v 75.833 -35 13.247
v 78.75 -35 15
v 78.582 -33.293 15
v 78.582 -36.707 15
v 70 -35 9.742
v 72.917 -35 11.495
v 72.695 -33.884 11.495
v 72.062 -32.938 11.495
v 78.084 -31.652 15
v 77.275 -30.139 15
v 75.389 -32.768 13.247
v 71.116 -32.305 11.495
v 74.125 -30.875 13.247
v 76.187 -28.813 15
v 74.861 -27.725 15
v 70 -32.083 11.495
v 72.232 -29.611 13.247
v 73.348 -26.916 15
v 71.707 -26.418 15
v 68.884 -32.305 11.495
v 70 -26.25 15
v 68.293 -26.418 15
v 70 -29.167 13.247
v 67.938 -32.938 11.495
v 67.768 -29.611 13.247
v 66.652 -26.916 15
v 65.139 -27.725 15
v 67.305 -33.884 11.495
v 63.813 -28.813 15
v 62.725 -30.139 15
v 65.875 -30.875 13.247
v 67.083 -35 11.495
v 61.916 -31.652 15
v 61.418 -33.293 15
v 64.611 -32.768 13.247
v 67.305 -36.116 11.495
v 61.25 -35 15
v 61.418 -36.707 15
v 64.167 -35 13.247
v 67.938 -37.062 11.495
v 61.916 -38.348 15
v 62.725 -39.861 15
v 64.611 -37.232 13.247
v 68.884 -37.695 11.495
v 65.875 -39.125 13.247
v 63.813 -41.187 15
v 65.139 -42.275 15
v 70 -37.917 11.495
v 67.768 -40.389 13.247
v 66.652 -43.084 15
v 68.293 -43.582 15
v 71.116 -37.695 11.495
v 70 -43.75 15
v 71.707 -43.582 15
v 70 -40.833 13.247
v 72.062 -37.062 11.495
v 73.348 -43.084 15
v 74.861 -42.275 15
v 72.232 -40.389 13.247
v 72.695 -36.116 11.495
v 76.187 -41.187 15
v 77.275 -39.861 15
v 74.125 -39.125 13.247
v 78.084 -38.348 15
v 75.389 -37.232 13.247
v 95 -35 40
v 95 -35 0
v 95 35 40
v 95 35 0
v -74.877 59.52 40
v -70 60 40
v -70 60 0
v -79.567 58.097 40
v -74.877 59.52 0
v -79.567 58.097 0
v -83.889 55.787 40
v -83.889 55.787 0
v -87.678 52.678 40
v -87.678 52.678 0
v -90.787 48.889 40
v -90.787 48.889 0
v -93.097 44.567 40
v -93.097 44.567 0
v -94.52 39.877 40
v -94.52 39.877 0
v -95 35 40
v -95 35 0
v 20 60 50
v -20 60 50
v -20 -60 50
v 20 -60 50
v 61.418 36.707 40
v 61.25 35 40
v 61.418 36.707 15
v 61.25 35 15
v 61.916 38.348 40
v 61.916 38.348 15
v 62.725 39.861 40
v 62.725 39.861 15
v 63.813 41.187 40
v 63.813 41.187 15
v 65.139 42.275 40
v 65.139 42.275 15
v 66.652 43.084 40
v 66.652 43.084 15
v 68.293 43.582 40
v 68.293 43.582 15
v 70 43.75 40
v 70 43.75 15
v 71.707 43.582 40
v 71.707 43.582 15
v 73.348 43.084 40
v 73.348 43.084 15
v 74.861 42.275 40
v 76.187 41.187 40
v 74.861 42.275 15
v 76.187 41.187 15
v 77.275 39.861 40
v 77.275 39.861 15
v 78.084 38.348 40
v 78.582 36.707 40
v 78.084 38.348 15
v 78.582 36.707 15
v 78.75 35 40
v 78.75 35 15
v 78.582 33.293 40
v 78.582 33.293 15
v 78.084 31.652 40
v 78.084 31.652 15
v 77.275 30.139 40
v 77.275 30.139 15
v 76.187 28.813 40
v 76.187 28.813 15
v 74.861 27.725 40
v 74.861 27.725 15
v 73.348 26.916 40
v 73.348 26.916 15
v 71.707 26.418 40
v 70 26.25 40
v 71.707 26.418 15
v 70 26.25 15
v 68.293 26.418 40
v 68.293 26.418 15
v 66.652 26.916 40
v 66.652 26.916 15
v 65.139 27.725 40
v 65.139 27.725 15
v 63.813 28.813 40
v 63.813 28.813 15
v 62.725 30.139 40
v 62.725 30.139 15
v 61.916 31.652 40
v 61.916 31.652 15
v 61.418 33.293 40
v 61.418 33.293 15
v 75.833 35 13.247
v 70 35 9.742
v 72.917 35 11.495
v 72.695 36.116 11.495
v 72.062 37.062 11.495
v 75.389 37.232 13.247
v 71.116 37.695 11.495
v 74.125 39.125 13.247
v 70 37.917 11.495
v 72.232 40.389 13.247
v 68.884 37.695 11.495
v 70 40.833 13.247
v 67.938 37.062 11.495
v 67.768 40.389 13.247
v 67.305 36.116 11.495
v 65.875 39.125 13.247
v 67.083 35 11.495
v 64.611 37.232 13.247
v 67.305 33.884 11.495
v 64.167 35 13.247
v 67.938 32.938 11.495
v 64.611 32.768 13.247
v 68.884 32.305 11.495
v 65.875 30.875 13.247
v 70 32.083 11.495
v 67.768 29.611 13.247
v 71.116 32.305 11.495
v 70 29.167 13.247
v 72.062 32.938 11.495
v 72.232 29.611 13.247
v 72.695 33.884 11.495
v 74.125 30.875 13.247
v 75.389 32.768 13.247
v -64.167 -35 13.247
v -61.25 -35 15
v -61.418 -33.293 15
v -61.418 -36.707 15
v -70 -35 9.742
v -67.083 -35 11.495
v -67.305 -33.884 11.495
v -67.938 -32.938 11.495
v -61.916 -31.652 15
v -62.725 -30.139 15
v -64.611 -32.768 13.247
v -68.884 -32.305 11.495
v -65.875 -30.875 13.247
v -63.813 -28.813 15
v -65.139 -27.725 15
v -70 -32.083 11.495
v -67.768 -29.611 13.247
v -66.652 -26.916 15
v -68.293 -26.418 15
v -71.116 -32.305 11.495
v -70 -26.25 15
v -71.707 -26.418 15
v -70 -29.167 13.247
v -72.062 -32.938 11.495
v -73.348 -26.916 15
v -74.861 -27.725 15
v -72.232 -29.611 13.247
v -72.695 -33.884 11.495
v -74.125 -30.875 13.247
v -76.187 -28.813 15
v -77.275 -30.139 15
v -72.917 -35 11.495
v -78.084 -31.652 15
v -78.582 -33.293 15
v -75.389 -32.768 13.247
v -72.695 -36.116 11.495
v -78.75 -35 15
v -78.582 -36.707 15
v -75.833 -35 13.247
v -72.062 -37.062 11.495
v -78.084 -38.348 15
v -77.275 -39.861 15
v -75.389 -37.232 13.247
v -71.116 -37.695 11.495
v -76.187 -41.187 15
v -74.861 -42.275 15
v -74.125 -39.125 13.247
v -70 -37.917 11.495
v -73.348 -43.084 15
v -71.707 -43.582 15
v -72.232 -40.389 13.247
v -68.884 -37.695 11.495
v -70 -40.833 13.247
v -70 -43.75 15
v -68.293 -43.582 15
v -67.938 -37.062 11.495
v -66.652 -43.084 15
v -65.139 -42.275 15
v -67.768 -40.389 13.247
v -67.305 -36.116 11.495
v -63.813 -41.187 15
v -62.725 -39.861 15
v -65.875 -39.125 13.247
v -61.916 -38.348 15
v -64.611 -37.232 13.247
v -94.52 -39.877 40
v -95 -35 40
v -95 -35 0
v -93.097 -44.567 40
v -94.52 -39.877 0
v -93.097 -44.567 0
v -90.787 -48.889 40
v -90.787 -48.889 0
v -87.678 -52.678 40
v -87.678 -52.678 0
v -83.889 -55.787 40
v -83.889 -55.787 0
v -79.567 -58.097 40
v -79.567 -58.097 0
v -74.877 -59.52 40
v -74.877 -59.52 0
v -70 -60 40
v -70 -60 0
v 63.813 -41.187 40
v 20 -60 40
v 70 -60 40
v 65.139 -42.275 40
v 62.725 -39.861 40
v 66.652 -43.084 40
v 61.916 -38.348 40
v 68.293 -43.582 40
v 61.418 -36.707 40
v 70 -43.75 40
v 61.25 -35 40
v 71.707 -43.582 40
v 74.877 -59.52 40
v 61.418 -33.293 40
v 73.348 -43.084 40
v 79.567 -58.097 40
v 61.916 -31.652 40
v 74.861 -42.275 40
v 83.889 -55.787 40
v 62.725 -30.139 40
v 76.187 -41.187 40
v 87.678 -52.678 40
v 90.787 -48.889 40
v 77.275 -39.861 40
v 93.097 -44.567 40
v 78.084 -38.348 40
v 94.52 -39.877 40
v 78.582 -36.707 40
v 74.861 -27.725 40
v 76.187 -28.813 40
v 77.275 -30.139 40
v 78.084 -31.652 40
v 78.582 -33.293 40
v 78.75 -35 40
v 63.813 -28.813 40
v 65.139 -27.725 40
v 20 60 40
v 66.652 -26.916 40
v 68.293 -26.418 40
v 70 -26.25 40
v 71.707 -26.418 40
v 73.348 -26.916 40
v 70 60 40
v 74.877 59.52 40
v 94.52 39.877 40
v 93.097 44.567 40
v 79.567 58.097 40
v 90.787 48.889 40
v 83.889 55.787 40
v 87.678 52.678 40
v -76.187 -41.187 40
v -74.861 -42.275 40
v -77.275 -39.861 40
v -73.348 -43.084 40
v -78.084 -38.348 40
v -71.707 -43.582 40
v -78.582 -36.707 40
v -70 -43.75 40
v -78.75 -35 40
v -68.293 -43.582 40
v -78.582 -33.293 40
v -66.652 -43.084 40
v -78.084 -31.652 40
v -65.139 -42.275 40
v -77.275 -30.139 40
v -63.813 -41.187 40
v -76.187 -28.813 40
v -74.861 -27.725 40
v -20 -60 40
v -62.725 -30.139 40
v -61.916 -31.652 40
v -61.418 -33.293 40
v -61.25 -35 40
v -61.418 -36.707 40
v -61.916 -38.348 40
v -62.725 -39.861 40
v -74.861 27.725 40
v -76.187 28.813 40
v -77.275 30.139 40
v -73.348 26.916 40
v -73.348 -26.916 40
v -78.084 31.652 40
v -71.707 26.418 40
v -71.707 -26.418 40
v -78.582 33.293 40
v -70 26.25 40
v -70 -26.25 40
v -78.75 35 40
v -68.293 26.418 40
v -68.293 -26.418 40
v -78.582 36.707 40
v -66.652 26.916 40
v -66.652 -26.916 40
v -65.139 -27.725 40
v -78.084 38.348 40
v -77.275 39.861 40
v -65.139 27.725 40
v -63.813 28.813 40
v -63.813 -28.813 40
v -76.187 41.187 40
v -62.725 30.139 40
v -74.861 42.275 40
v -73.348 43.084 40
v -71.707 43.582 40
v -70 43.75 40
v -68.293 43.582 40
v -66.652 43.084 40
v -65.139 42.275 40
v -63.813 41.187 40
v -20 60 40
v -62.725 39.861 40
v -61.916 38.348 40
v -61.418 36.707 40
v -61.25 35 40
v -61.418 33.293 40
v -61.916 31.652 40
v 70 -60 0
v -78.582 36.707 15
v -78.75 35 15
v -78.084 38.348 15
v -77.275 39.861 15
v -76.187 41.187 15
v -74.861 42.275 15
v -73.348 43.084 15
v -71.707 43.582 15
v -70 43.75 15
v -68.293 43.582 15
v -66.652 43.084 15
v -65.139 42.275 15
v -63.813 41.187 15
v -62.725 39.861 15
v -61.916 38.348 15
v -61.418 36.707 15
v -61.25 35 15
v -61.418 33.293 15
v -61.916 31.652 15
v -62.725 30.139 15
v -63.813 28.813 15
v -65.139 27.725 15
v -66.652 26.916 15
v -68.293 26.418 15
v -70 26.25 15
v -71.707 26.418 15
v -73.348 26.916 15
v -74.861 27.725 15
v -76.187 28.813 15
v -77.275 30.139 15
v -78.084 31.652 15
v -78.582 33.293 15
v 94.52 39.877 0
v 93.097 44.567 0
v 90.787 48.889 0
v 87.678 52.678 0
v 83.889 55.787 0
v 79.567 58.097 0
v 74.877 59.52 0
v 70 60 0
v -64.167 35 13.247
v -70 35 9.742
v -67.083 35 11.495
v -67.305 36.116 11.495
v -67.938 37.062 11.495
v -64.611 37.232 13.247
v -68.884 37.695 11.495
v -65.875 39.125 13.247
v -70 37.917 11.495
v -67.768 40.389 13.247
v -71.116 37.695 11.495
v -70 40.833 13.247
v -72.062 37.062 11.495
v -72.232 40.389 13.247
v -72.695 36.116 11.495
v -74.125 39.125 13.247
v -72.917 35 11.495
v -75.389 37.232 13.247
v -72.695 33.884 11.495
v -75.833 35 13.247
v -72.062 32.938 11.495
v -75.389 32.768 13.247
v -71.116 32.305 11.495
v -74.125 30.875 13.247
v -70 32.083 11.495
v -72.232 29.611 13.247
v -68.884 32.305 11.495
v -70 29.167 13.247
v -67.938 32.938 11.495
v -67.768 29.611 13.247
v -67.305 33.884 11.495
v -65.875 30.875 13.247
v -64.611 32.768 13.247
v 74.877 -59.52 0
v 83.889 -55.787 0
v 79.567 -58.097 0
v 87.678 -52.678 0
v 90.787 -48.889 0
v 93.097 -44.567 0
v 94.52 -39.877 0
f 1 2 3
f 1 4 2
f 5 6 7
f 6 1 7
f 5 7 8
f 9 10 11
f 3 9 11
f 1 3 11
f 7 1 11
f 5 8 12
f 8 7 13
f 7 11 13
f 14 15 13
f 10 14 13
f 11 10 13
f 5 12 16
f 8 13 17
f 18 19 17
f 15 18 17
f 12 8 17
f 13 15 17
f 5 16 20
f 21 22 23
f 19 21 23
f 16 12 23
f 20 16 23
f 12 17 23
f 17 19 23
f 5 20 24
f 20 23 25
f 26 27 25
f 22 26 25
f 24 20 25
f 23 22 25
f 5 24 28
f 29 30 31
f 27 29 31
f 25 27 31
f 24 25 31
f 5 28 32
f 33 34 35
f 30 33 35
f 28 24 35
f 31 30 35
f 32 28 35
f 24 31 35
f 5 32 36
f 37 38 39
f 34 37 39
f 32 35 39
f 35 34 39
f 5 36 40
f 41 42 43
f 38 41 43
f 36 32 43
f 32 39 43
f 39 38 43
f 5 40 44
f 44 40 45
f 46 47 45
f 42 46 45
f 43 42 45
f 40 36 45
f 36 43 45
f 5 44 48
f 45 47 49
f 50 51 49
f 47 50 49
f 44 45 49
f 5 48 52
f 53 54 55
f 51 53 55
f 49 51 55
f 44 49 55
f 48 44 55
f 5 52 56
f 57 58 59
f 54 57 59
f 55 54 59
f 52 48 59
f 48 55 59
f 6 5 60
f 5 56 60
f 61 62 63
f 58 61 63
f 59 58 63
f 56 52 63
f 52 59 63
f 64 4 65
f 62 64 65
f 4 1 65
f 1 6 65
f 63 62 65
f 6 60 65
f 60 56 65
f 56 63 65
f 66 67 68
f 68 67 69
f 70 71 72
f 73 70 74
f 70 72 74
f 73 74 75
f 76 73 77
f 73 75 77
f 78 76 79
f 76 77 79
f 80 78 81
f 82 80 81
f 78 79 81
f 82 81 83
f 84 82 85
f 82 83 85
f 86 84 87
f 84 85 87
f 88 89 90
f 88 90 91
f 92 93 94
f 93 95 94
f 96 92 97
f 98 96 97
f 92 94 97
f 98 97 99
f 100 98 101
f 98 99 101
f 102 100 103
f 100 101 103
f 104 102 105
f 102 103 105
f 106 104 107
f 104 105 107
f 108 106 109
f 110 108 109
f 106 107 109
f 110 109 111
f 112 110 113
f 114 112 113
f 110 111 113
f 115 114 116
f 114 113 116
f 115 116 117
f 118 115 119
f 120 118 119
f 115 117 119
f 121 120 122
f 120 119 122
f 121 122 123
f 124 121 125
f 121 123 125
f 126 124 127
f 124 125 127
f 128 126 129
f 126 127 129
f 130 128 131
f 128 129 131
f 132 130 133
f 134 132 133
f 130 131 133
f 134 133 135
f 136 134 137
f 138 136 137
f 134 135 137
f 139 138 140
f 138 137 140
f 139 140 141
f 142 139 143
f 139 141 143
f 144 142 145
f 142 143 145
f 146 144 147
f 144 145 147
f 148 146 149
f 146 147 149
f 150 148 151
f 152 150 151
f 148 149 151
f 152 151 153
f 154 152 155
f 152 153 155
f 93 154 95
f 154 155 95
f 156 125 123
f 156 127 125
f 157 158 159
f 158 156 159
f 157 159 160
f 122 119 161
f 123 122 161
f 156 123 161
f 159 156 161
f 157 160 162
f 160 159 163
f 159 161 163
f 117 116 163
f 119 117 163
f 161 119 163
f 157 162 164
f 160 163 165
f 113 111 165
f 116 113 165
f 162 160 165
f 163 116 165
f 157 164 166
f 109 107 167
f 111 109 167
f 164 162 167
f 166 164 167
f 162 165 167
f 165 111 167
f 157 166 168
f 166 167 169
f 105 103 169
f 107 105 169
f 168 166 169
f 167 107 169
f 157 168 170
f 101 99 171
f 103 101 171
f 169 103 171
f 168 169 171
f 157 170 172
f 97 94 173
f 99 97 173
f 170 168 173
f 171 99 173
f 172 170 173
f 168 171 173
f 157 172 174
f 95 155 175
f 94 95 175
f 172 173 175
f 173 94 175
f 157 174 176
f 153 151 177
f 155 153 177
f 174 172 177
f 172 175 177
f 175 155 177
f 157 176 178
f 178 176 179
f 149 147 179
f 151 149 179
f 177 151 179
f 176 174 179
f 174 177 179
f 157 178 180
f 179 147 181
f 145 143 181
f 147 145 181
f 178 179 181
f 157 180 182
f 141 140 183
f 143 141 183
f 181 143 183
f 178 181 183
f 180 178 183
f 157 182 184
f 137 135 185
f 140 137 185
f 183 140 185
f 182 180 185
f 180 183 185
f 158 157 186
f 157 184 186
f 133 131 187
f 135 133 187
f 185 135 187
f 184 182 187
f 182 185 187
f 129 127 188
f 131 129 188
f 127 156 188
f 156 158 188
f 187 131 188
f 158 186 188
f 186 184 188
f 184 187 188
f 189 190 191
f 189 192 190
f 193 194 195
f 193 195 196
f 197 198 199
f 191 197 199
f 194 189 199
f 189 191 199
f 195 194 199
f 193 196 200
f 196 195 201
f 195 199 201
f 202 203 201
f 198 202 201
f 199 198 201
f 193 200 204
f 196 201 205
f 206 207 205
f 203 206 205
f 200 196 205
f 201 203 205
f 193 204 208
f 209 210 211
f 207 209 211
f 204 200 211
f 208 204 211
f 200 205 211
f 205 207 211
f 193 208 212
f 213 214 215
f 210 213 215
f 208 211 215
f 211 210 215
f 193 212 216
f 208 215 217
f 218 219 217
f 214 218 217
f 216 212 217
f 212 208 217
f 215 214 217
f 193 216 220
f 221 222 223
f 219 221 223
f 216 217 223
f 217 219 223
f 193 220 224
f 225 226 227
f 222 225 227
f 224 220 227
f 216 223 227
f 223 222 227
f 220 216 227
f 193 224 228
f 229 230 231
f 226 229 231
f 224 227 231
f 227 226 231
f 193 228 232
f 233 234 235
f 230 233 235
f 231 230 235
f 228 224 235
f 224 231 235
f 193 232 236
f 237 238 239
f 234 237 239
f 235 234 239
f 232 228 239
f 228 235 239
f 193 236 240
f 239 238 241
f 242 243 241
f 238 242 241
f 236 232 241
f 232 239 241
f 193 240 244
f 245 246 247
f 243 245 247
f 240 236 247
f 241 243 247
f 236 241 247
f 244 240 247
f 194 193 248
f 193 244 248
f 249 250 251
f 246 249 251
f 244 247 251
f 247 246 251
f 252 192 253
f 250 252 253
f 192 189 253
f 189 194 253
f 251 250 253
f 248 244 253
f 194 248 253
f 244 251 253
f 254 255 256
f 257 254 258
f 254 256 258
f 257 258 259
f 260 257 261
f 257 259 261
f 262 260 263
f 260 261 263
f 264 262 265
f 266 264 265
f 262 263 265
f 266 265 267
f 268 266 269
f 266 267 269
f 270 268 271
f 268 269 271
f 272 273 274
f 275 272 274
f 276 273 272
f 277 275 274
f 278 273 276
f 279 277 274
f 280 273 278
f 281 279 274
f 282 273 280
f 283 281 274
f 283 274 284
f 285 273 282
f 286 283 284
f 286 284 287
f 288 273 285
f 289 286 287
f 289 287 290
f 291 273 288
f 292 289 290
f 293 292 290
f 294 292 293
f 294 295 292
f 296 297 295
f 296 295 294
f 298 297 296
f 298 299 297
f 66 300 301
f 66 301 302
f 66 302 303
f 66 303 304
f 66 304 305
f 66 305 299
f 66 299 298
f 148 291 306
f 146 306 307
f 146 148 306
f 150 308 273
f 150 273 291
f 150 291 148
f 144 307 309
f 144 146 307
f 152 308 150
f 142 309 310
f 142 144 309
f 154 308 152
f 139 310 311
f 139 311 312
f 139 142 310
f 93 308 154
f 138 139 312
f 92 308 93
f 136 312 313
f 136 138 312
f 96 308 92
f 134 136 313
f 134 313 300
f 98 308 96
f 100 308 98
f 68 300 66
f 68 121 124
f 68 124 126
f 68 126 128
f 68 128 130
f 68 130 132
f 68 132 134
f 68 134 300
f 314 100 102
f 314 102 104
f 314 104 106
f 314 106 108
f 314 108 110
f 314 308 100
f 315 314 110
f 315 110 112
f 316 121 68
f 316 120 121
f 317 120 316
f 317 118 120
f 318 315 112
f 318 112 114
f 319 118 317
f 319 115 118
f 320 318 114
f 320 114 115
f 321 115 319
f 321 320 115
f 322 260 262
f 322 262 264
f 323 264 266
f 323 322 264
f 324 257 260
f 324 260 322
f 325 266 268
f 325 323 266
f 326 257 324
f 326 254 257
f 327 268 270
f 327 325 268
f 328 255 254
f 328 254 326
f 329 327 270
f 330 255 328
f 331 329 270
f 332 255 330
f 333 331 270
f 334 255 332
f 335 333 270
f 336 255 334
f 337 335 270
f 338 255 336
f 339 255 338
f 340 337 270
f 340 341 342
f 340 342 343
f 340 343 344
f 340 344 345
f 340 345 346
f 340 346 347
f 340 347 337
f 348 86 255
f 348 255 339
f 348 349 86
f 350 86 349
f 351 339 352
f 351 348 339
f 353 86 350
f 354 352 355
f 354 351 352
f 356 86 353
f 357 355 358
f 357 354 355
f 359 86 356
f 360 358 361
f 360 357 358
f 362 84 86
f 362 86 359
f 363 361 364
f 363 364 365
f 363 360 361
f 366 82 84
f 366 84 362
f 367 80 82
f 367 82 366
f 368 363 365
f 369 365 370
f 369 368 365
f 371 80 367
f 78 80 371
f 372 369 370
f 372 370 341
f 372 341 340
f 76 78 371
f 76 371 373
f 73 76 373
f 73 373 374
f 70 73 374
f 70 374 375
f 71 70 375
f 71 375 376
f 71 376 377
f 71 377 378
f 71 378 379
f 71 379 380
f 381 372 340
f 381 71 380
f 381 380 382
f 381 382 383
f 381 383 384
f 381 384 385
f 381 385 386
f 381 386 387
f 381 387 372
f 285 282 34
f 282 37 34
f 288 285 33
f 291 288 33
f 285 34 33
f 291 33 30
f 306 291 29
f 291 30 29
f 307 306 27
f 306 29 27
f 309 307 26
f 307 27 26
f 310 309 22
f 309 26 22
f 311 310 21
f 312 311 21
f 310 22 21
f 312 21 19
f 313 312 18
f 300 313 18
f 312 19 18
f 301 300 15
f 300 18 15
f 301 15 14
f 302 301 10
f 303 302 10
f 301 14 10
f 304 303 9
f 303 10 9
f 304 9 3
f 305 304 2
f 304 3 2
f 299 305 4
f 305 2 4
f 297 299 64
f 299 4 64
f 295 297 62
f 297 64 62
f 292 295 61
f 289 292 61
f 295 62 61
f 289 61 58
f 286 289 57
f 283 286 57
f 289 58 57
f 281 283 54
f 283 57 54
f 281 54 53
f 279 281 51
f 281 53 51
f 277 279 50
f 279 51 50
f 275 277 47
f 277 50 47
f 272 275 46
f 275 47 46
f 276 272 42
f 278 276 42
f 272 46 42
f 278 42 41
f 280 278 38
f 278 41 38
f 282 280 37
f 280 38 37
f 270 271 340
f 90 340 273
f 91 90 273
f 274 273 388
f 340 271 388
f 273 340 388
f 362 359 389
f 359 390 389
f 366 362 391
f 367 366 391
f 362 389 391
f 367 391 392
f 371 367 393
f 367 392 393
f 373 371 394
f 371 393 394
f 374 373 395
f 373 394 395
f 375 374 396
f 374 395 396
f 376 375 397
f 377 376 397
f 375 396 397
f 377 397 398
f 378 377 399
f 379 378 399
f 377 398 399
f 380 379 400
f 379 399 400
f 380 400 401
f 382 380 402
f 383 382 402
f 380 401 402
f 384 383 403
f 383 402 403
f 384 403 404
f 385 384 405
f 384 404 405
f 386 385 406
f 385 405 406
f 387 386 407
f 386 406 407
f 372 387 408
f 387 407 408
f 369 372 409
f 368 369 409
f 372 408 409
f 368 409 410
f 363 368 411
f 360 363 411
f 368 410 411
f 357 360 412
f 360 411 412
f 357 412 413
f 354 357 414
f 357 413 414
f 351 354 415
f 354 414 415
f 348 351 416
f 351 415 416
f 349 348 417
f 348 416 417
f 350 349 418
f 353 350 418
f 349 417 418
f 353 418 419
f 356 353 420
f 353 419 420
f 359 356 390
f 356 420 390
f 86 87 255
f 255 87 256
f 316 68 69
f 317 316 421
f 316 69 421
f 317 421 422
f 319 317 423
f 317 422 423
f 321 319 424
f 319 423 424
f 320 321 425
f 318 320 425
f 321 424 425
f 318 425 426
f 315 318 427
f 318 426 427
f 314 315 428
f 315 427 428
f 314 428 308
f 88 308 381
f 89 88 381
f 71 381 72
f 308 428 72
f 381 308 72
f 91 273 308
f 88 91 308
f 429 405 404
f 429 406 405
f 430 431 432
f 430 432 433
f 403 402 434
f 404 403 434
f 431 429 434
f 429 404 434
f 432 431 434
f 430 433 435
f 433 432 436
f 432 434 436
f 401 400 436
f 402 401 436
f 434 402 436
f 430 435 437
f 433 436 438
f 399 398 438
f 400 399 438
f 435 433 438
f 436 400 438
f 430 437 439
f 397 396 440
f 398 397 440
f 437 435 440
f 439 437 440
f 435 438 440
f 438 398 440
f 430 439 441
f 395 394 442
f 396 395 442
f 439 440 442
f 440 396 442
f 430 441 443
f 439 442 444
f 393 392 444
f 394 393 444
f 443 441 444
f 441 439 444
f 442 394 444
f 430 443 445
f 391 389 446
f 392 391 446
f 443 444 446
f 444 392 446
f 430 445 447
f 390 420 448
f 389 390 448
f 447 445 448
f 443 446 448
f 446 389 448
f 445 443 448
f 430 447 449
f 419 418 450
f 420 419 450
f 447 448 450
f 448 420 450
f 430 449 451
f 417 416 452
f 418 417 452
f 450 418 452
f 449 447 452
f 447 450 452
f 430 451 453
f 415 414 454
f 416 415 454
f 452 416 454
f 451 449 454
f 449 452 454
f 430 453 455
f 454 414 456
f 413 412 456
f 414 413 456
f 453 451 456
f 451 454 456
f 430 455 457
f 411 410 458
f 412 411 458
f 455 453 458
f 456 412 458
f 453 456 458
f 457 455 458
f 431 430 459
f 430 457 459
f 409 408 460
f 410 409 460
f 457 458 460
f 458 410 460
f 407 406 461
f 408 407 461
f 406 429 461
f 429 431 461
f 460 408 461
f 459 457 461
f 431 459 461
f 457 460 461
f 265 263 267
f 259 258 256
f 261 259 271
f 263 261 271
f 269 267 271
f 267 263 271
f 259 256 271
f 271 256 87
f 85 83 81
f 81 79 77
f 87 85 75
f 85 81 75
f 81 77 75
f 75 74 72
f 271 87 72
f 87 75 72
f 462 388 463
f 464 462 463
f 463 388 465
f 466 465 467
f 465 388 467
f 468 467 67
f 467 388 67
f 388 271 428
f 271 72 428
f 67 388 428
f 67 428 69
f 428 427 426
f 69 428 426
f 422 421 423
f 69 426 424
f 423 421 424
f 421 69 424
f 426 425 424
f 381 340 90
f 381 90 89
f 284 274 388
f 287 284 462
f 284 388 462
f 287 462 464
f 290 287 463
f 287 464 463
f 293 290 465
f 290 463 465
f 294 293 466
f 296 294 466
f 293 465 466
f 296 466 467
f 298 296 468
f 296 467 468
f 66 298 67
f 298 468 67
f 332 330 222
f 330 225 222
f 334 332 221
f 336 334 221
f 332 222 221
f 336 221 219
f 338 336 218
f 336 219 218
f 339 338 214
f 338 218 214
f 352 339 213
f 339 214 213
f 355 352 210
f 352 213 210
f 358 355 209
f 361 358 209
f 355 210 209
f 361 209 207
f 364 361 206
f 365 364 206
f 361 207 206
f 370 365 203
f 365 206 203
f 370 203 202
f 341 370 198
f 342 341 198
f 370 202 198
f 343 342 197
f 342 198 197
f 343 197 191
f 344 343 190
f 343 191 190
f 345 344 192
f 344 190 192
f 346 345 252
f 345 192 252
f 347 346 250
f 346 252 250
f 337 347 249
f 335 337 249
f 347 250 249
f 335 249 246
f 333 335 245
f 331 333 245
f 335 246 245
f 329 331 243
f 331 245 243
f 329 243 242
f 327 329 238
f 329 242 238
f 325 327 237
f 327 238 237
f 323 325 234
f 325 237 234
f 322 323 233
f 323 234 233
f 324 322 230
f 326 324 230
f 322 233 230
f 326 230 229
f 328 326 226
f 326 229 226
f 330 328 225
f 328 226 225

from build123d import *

# Parameters (mm, degrees)
BOSS_EXTRUDE3_DEPTH    = 40
M20_TAPPED_HOLE1_D     = 17.5
M20_TAPPED_HOLE1_DEPTH = 25
M20_TAPPED_HOLE1_TIP   = 5.257530416
SKETCH6_W              = 40
SKETCH6_H              = 120
BOSS_EXTRUDE4_DEPTH    = 10


with BuildPart() as part:
    # Sketch1 → Boss-Extrude3 (new body)
    with BuildSketch(Plane.XY):
        with BuildLine():
            Line((70, 60), (-70, 60))
            ThreePointArc((-70, 60), (-87.67766953, 52.67766953), (-95, 35))
            Line((-95, 35), (-95, -35))
            ThreePointArc((-95, -35), (-87.67766953, -52.67766953), (-70, -60))
            Line((-70, -60), (70, -60))
            ThreePointArc((70, -60), (87.67766953, -52.67766953), (95, -35))
            Line((95, -35), (95, 35))
            ThreePointArc((95, 35), (87.67766953, 52.67766953), (70, 60))
        make_face()
    extrude(amount=BOSS_EXTRUDE3_DEPTH)

    # M20 Tapped Hole1
    with Locations(Plane(origin=(-70, 35, 40), x_dir=(1, 0, 0), z_dir=(0, 0, 1))):
        with Locations((0, 0), (0, -70), (140, -70), (140, 0)):
            Hole(M20_TAPPED_HOLE1_D / 2, depth=M20_TAPPED_HOLE1_DEPTH)
            with Locations((0, 0, -(M20_TAPPED_HOLE1_DEPTH + M20_TAPPED_HOLE1_TIP / 2))):  # 118° drill point
                Cone(0, M20_TAPPED_HOLE1_D / 2, M20_TAPPED_HOLE1_TIP, mode=Mode.SUBTRACT)

    # Sketch6 → Boss-Extrude4 (add)
    with BuildSketch(Plane.XY.offset(40)):
        Rectangle(SKETCH6_W, SKETCH6_H)
    extrude(amount=BOSS_EXTRUDE4_DEPTH)


solid = part.part
